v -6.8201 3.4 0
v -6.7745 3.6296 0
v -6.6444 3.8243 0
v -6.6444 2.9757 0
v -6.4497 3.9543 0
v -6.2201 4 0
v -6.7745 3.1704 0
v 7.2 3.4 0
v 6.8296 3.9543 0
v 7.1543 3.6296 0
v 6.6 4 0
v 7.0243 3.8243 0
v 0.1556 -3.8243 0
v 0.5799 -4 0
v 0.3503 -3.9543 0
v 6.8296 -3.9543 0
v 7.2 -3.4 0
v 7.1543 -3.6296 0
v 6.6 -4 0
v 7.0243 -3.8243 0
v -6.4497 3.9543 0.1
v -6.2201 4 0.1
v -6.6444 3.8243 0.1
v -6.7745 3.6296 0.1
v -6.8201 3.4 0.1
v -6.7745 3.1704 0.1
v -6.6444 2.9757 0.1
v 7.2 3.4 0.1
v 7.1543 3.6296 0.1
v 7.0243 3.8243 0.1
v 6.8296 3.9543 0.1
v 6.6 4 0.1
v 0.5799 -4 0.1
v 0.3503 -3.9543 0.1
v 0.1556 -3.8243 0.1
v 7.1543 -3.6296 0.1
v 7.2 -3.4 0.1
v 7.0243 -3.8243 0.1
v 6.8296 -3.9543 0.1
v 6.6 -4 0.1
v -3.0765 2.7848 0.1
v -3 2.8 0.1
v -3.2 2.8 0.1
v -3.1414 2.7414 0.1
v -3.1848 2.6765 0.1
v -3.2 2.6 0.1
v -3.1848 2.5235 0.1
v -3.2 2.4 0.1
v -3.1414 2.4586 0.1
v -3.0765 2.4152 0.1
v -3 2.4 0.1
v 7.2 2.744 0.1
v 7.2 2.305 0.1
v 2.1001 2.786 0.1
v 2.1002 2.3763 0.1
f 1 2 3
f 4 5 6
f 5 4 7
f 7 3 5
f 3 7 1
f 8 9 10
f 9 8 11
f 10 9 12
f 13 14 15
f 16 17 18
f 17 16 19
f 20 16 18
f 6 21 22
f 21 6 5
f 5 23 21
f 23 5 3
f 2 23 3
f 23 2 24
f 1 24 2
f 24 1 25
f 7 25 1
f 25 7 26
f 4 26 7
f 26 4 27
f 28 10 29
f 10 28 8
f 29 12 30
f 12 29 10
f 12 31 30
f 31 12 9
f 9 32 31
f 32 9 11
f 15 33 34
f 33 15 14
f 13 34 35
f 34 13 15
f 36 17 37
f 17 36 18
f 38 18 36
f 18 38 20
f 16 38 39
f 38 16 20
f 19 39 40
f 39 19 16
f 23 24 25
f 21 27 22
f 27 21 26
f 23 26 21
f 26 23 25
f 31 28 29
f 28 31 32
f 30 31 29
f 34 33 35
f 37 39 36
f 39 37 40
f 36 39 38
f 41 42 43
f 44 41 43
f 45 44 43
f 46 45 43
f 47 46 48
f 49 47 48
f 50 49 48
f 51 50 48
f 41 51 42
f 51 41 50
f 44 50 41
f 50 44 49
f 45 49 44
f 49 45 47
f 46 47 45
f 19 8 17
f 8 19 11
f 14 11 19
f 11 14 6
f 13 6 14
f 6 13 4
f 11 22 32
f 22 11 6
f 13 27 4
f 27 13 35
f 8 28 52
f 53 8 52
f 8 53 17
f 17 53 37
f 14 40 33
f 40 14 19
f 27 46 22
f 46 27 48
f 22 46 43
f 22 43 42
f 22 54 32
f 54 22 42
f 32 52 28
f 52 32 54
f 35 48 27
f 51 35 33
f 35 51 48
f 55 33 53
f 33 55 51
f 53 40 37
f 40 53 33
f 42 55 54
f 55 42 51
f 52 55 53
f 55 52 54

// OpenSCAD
// file: ../p/3-8cyli.scad
use <../lib.scad>
function ldraw_lib__3_8cyli() = [
// 0 Cylinder 0.375
// 0 Name: 3-8cyli.dat
// 0 Author: James Jessiman
// 0 !LDRAW_ORG Primitive UPDATE 2005-01
// 0 !LICENSE Licensed under CC BY 4.0 : see CAreadme.txt
// 
// 0 BFC CERTIFY CCW
  [0,"BFC","CERTIFY"],
  [0,"BFC","CCW"],
// 
// 0 !HISTORY 2002-05-08 [OrionP] Made BFC compliant
// 0 !HISTORY 2002-08-18 [PTadmin] Official Update 2002-04
// 0 !HISTORY 2004-12-11 [nielsk] Recreated using Primitive Generator, Edge lines fixed, BFC changed to CCW
// 0 !HISTORY 2005-12-28 [PTadmin] Official Update 2005-01
// 0 !HISTORY 2007-06-24 [PTadmin] Header formatted for Contributor Agreement
// 0 !HISTORY 2008-07-01 [PTadmin] Official Update 2008-01
// 
// 
// 4 16 .9239 1 .3827 .9239 0 .3827 1 0 0 1 1 0
  [4,16,.9239,1,.3827,.9239,0,.3827,1,0,0,1,1,0],
// 4 16 .7071 1 .7071 .7071 0 .7071 .9239 0 .3827 .9239 1 .3827
  [4,16,.7071,1,.7071,.7071,0,.7071,.9239,0,.3827,.9239,1,.3827],
// 4 16 .3827 1 .9239 .3827 0 .9239 .7071 0 .7071 .7071 1 .7071
  [4,16,.3827,1,.9239,.3827,0,.9239,.7071,0,.7071,.7071,1,.7071],
// 4 16 0 1 1 0 0 1 .3827 0 .9239 .3827 1 .9239
  [4,16,0,1,1,0,0,1,.3827,0,.9239,.3827,1,.9239],
// 4 16 -.3827 1 .9239 -.3827 0 .9239 0 0 1 0 1 1
  [4,16,-.3827,1,.9239,-.3827,0,.9239,0,0,1,0,1,1],
// 4 16 -.7071 1 .7071 -.7071 0 .7071 -.3827 0 .9239 -.3827 1 .9239
  [4,16,-.7071,1,.7071,-.7071,0,.7071,-.3827,0,.9239,-.3827,1,.9239],
// 5 24 1 1 0 1 0 0 1 1 -.4142 .9239 1 .3827
  [5,24,1,1,0,1,0,0,1,1,-.4142,.9239,1,.3827],
// 5 24 .9239 1 .3827 .9239 0 .3827 1 1 0 .7071 1 .7071
  [5,24,.9239,1,.3827,.9239,0,.3827,1,1,0,.7071,1,.7071],
// 5 24 .7071 1 .7071 .7071 0 .7071 .9239 1 .3827 .3827 1 .9239
  [5,24,.7071,1,.7071,.7071,0,.7071,.9239,1,.3827,.3827,1,.9239],
// 5 24 .3827 1 .9239 .3827 0 .9239 .7071 1 .7071 0 1 1
  [5,24,.3827,1,.9239,.3827,0,.9239,.7071,1,.7071,0,1,1],
// 5 24 0 1 1 0 0 1 .3827 1 .9239 -.3827 1 .9239
  [5,24,0,1,1,0,0,1,.3827,1,.9239,-.3827,1,.9239],
// 5 24 -.3827 1 .9239 -.3827 0 .9239 0 1 1 -.7071 1 .7071
  [5,24,-.3827,1,.9239,-.3827,0,.9239,0,1,1,-.7071,1,.7071],
// 5 24 -.7071 1 .7071 -.7071 0 .7071 -.3827 1 .9239 -1 1 .4142
  [5,24,-.7071,1,.7071,-.7071,0,.7071,-.3827,1,.9239,-1,1,.4142],
// 0
];
module ldraw_lib__3_8cyli(step=0, col=false, unit=2/5, alt=false, line=0.2, solid=!$preview)
    makepoly(ldraw_lib__3_8cyli(), step=step, col=col, unit=unit, alt=alt, line=line, solid=solid);
ldraw_lib__3_8cyli(line=0.2);
// file: ../p/3-8chrd.scad
use <../lib.scad>
function ldraw_lib__3_8chrd() = [
// 0 Chord 0.375
// 0 Name: 3-8chrd.dat
// 0 Author: Donald Sutter [technog]
// 0 !LDRAW_ORG Primitive UPDATE 2005-01
// 0 !LICENSE Licensed under CC BY 4.0 : see CAreadme.txt
// 
// 0 BFC CERTIFY CCW
  [0,"BFC","CERTIFY"],
  [0,"BFC","CCW"],
// 
// 0 !HISTORY 2004-01-07 [Steffen] added primitive code for POVray
// 0 !HISTORY 2004-03-18 [mkennedy] removed pov code and rearanged polygons.
// 0 !HISTORY 2004-09-12 [cwdee] reversed winding and standardised precision
// 0 !HISTORY 2005-12-28 [PTadmin] Official Update 2005-01
// 0 !HISTORY 2007-06-24 [PTadmin] Header formatted for Contributor Agreement
// 0 !HISTORY 2008-07-01 [PTadmin] Official Update 2008-01
// 
// 
// 3 16 0.7071 0 0.7071 0.3827 0 0.9239 0 0 1
  [3,16,0.7071,0,0.7071,0.3827,0,0.9239,0,0,1],
// 4 16 0.9239 0 0.3827 -0.3827 0 0.9239 -0.7071 0 0.7071 1 0 0
  [4,16,0.9239,0,0.3827,-0.3827,0,0.9239,-0.7071,0,0.7071,1,0,0],
// 4 16 0.7071 0 0.7071 0 0 1 -0.3827 0 0.9239 0.9239 0 0.3827
  [4,16,0.7071,0,0.7071,0,0,1,-0.3827,0,0.9239,0.9239,0,0.3827],
// 0
];
module ldraw_lib__3_8chrd(step=0, col=false, unit=2/5, alt=false, line=0.2, solid=!$preview)
    makepoly(ldraw_lib__3_8chrd(), step=step, col=col, unit=unit, alt=alt, line=line, solid=solid);
ldraw_lib__3_8chrd(line=0.2);
// file: ../p/2-4ndis.scad
use <../lib.scad>
function ldraw_lib__2_4ndis() = [
// 0 Disc Negative 0.5
// 0 Name: 2-4ndis.dat
// 0 Author: James Jessiman
// 0 !LDRAW_ORG Primitive UPDATE 2012-01
// 0 !LICENSE Licensed under CC BY 4.0 : see CAreadme.txt
// 
// 0 BFC CERTIFY CCW
  [0,"BFC","CERTIFY"],
  [0,"BFC","CCW"],
// 
// 0 !HISTORY 2002-03-23 [sbliss] Added BFC statement; compacted code
// 0 !HISTORY 2002-04-25 [PTadmin] Official Update 2002-02
// 0 !HISTORY 2007-06-24 [PTadmin] Header formatted for Contributor Agreement
// 0 !HISTORY 2008-07-01 [PTadmin] Official Update 2008-01
// 0 !HISTORY 2012-02-16 [Philo] Changed to CCW
// 0 !HISTORY 2012-03-30 [PTadmin] Official Update 2012-01
// 
// 
// 3 16 0.9239 0 0.3827 1 0 0 1 0 1
  [3,16,0.9239,0,0.3827,1,0,0,1,0,1],
// 3 16 0.7071 0 0.7071 0.9239 0 0.3827 1 0 1
  [3,16,0.7071,0,0.7071,0.9239,0,0.3827,1,0,1],
// 3 16 0.3827 0 0.9239 0.7071 0 0.7071 1 0 1
  [3,16,0.3827,0,0.9239,0.7071,0,0.7071,1,0,1],
// 3 16 0 0 1 0.3827 0 0.9239 1 0 1
  [3,16,0,0,1,0.3827,0,0.9239,1,0,1],
// 3 16 -0.3827 0 0.9239 0 0 1 -1 0 1
  [3,16,-0.3827,0,0.9239,0,0,1,-1,0,1],
// 3 16 -0.7071 0 0.7071 -0.3827 0 0.9239 -1 0 1
  [3,16,-0.7071,0,0.7071,-0.3827,0,0.9239,-1,0,1],
// 3 16 -0.9239 0 0.3827 -0.7071 0 0.7071 -1 0 1
  [3,16,-0.9239,0,0.3827,-0.7071,0,0.7071,-1,0,1],
// 3 16 -1 0 0 -0.9239 0 0.3827 -1 0 1
  [3,16,-1,0,0,-0.9239,0,0.3827,-1,0,1],
];
module ldraw_lib__2_4ndis(step=0, col=false, unit=2/5, alt=false, line=0.2, solid=!$preview)
    makepoly(ldraw_lib__2_4ndis(), step=step, col=col, unit=unit, alt=alt, line=line, solid=solid);
ldraw_lib__2_4ndis(line=0.2);
// file: ../p/2-4chrd.scad
use <../lib.scad>
function ldraw_lib__2_4chrd() = [
// 0 Chord 0.5
// 0 Name: 2-4chrd.dat
// 0 Author: Philippe Hurbain [Philo]
// 0 !LDRAW_ORG Primitive UPDATE 2014-01
// 0 !LICENSE Licensed under CC BY 4.0 : see CAreadme.txt
// 
// 0 BFC CERTIFY CCW
  [0,"BFC","CERTIFY"],
  [0,"BFC","CCW"],
// 
// 0 !HISTORY 2014-06-21 [PTadmin] Official Update 2014-01
// 
// 
// 4 16 0.9239 0 0.3827 -0.9239 0 0.3827 -1 0 0 1 0 0
  [4,16,0.9239,0,0.3827,-0.9239,0,0.3827,-1,0,0,1,0,0],
// 4 16 0.7071 0 0.7071 -0.7071 0 0.7071 -0.9239 0 0.3827 0.9239 0 0.3827
  [4,16,0.7071,0,0.7071,-0.7071,0,0.7071,-0.9239,0,0.3827,0.9239,0,0.3827],
// 4 16 0.3827 0 0.9239 -0.3827 0 0.9239 -0.7071 0 0.7071 0.7071 0 0.7071
  [4,16,0.3827,0,0.9239,-0.3827,0,0.9239,-0.7071,0,0.7071,0.7071,0,0.7071],
// 3 16 0 0 1 -0.3827 0 0.9239 0.3827 0 0.9239
  [3,16,0,0,1,-0.3827,0,0.9239,0.3827,0,0.9239],
];
module ldraw_lib__2_4chrd(step=0, col=false, unit=2/5, alt=false, line=0.2, solid=!$preview)
    makepoly(ldraw_lib__2_4chrd(), step=step, col=col, unit=unit, alt=alt, line=line, solid=solid);
ldraw_lib__2_4chrd(line=0.2);
// file: ../p/1-8cyli.scad
use <../lib.scad>
function ldraw_lib__1_8cyli() = [
// 0 Cylinder 0.125
// 0 Name: 1-8cyli.dat
// 0 Author: James Jessiman
// 0 !LDRAW_ORG Primitive UPDATE 2005-01
// 0 !LICENSE Licensed under CC BY 4.0 : see CAreadme.txt
// 
// 0 BFC CERTIFY CCW
  [0,"BFC","CERTIFY"],
  [0,"BFC","CCW"],
// 
// 0 !HISTORY 2002-04-25 [PTadmin] Official Update 2002-02
// 0 !HISTORY 2004-12-11 [nielsk] Recreated using Primitive Generator, Edge lines fixed, BFC changed to CCW
// 0 !HISTORY 2005-12-28 [PTadmin] Official Update 2005-01
// 0 !HISTORY 2007-06-22 [PTadmin] Header formatted for Contributor Agreement
// 0 !HISTORY 2008-07-01 [PTadmin] Official Update 2008-01
// 
// 
// 4 16 .9239 1 .3827 .9239 0 .3827 1 0 0 1 1 0
  [4,16,.9239,1,.3827,.9239,0,.3827,1,0,0,1,1,0],
// 4 16 .7071 1 .7071 .7071 0 .7071 .9239 0 .3827 .9239 1 .3827
  [4,16,.7071,1,.7071,.7071,0,.7071,.9239,0,.3827,.9239,1,.3827],
// 5 24 1 1 0 1 0 0 1 1 -.4142 .9239 1 .3827
  [5,24,1,1,0,1,0,0,1,1,-.4142,.9239,1,.3827],
// 5 24 .9239 1 .3827 .9239 0 .3827 1 1 0 .7071 1 .7071
  [5,24,.9239,1,.3827,.9239,0,.3827,1,1,0,.7071,1,.7071],
// 5 24 .7071 1 .7071 .7071 0 .7071 .9239 1 .3827 .4142 1 1
  [5,24,.7071,1,.7071,.7071,0,.7071,.9239,1,.3827,.4142,1,1],
// 0
];
module ldraw_lib__1_8cyli(step=0, col=false, unit=2/5, alt=false, line=0.2, solid=!$preview)
    makepoly(ldraw_lib__1_8cyli(), step=step, col=col, unit=unit, alt=alt, line=line, solid=solid);
ldraw_lib__1_8cyli(line=0.2);
// file: ../p/1-8chrd.scad
use <../lib.scad>
function ldraw_lib__1_8chrd() = [
// 0 Chord 0.125
// 0 Name: 1-8chrd.dat
// 0 Author: Orion Pobursky [OrionP]
// 0 !LDRAW_ORG Primitive UPDATE 2023-05
// 0 !LICENSE Licensed under CC BY 4.0 : see CAreadme.txt
// 
// 0 BFC CERTIFY CCW
  [0,"BFC","CERTIFY"],
  [0,"BFC","CCW"],
// 
// 0 !HISTORY 2004-04-22 [PTadmin] Official Update 2004-02
// 0 !HISTORY 2007-06-22 [PTadmin] Header formatted for Contributor Agreement
// 0 !HISTORY 2008-07-01 [PTadmin] Official Update 2008-01
// 0 !HISTORY 2023-10-27 [OrionP] Rebuilt with PrimGen2, original author westrate
// 0 !HISTORY 2023-10-31 [OrionP] Official Update 2023-05
// 
// 3 16 1 0 0 0.9239 0 0.3827 0.7071 0 0.7071
  [3,16,1,0,0,0.9239,0,0.3827,0.7071,0,0.7071],
];
module ldraw_lib__1_8chrd(step=0, col=false, unit=2/5, alt=false, line=0.2, solid=!$preview)
    makepoly(ldraw_lib__1_8chrd(), step=step, col=col, unit=unit, alt=alt, line=line, solid=solid);
ldraw_lib__1_8chrd(line=0.2);
// file: ../p/1-4cyli.scad
use <../lib.scad>
function ldraw_lib__1_4cyli() = [
// 0 Cylinder 0.25
// 0 Name: 1-4cyli.dat
// 0 Author: James Jessiman
// 0 !LDRAW_ORG Primitive UPDATE 2012-01
// 0 !LICENSE Licensed under CC BY 4.0 : see CAreadme.txt
// 
// 0 BFC CERTIFY CCW
  [0,"BFC","CERTIFY"],
  [0,"BFC","CCW"],
// 
// 0 !HISTORY 2002-03-23 [sbliss] Added BFC statement.
// 0 !HISTORY 2002-04-25 [PTadmin] Official Update 2002-02
// 0 !HISTORY 2007-06-22 [PTadmin] Header formatted for Contributor Agreement
// 0 !HISTORY 2008-07-01 [PTadmin] Official Update 2008-01
// 0 !HISTORY 2012-02-16 [Philo] Changed to CCW
// 0 !HISTORY 2012-03-30 [PTadmin] Official Update 2012-01
// 
// 
// 4 16 1 1 0 0.9239 1 0.3827 0.9239 0 0.3827 1 0 0
  [4,16,1,1,0,0.9239,1,0.3827,0.9239,0,0.3827,1,0,0],
// 5 24 1 0 0 1 1 0 0.9239 0 0.3827 1 0 -1
  [5,24,1,0,0,1,1,0,0.9239,0,0.3827,1,0,-1],
// 4 16 0.9239 1 0.3827 0.7071 1 0.7071 0.7071 0 0.7071 0.9239 0 0.3827
  [4,16,0.9239,1,0.3827,0.7071,1,0.7071,0.7071,0,0.7071,0.9239,0,0.3827],
// 5 24 0.9239 0 0.3827 0.9239 1 0.3827 0.7071 0 0.7071 1 0 0
  [5,24,0.9239,0,0.3827,0.9239,1,0.3827,0.7071,0,0.7071,1,0,0],
// 4 16 0.7071 1 0.7071 0.3827 1 0.9239 0.3827 0 0.9239 0.7071 0 0.7071
  [4,16,0.7071,1,0.7071,0.3827,1,0.9239,0.3827,0,0.9239,0.7071,0,0.7071],
// 5 24 0.7071 0 0.7071 0.7071 1 0.7071 0.3827 0 0.9239 0.9239 0 0.3827
  [5,24,0.7071,0,0.7071,0.7071,1,0.7071,0.3827,0,0.9239,0.9239,0,0.3827],
// 4 16 0.3827 1 0.9239 0 1 1 0 0 1 0.3827 0 0.9239
  [4,16,0.3827,1,0.9239,0,1,1,0,0,1,0.3827,0,0.9239],
// 5 24 0.3827 0 0.9239 0.3827 1 0.9239 0 0 1 0.7071 0 0.7071
  [5,24,0.3827,0,0.9239,0.3827,1,0.9239,0,0,1,0.7071,0,0.7071],
// 5 24 0 0 1 0 1 1 0.3827 0 0.9239 -1 0 1
  [5,24,0,0,1,0,1,1,0.3827,0,0.9239,-1,0,1],
];
module ldraw_lib__1_4cyli(step=0, col=false, unit=2/5, alt=false, line=0.2, solid=!$preview)
    makepoly(ldraw_lib__1_4cyli(), step=step, col=col, unit=unit, alt=alt, line=line, solid=solid);
ldraw_lib__1_4cyli(line=0.2);
// file: ../p/1-4chrd.scad
use <../lib.scad>
function ldraw_lib__1_4chrd() = [
// 0 Chord 0.25
// 0 Name: 1-4chrd.dat
// 0 Author: Max Martin Richter [MMR1988]
// 0 !LDRAW_ORG Primitive UPDATE 2023-05
// 0 !LICENSE Licensed under CC BY 4.0 : see CAreadme.txt
// 
// 0 BFC CERTIFY CCW
  [0,"BFC","CERTIFY"],
  [0,"BFC","CCW"],
// 
// 0 !HISTORY 2004-04-22 [PTadmin] Official Update 2004-02
// 0 !HISTORY 2007-10-09 [PTadmin] Header formatted for Contributor Agreement
// 0 !HISTORY 2008-07-01 [PTadmin] Official Update 2008-01
// 0 !HISTORY 2012-08-02 [MMR1988] Re-creation with PrimGen2 and Rectifier
// 0 !HISTORY 2012-08-09 [PTadmin] Official Update 2012-02
// 0 !HISTORY 2023-10-27 [OrionP] Change author to MMR1988 from hafhead
// 0 !HISTORY 2023-10-31 [OrionP] Official Update 2023-05
// 
// 4 16 0.9239 0 0.3827 0.3827 0 0.9239 0 0 1 1 0 0
  [4,16,0.9239,0,0.3827,0.3827,0,0.9239,0,0,1,1,0,0],
// 3 16 0.7071 0 0.7071 0.3827 0 0.9239 0.9239 0 0.3827
  [3,16,0.7071,0,0.7071,0.3827,0,0.9239,0.9239,0,0.3827],
];
module ldraw_lib__1_4chrd(step=0, col=false, unit=2/5, alt=false, line=0.2, solid=!$preview)
    makepoly(ldraw_lib__1_4chrd(), step=step, col=col, unit=unit, alt=alt, line=line, solid=solid);
ldraw_lib__1_4chrd(line=0.2);
// main file
use <../lib.scad>
use <../p/1-4chrd.scad>
use <../p/1-4cyli.scad>
use <../p/1-8chrd.scad>
use <../p/1-8cyli.scad>
use <../p/2-4chrd.scad>
use <../p/2-4ndis.scad>
use <../p/3-8chrd.scad>
use <../p/3-8cyli.scad>
function ldraw_lib__6148328aj() = [
// 0 Sticker  1.0 x  1.8 with White Stripe on Red Background Right
// 0 Name: 6148328aj.dat
// 0 Author: Massimo Maso [Sirio]
// 0 !LDRAW_ORG Part UPDATE 2024-08
// 0 !LICENSE Licensed under CC BY 4.0 : see CAreadme.txt
// 
// 0 BFC CERTIFY CCW
  [0,"BFC","CERTIFY"],
  [0,"BFC","CCW"],
// 
// 0 !KEYWORDS 917K, Bricklink 75876stk01, Brickowl 852010, Pit Lane, Porsche
// 0 !KEYWORDS Rebrickable 26357, set 75876, Speed Champions
// 
// 0 !HISTORY 2024-09-30 [OrionP] Official Update 2024-08
// 
// 
// 0 // Primitives
// 
// 1 16 -15.5503 0 8.5 0 0 -1.5 0 -1 0 1.5 0 0 3-8chrd.dat
  [1,16,-15.5503,0,8.5,0,0,-1.5,0,-1,0,1.5,0,0, ldraw_lib__3_8chrd()],
// 1 16 16.5 0 8.5 1.5 0 0 0 -1 0 0 0 1.5 1-4chrd.dat
  [1,16,16.5,0,8.5,1.5,0,0,0,-1,0,0,0,1.5, ldraw_lib__1_4chrd()],
// 1 16 1.4497 0 -8.5 0 0 -1.5 0 -1 0 -1.5 0 0 1-8chrd.dat
  [1,16,1.4497,0,-8.5,0,0,-1.5,0,-1,0,-1.5,0,0, ldraw_lib__1_8chrd()],
// 1 16 16.5 0 -8.5 1.5 0 0 0 -1 0 0 0 -1.5 1-4chrd.dat
  [1,16,16.5,0,-8.5,1.5,0,0,0,-1,0,0,0,-1.5, ldraw_lib__1_4chrd()],
// 1 16 -15.5503 0 8.5 0 0 -1.5 0 -.25 0 1.5 0 0 3-8cyli.dat
  [1,16,-15.5503,0,8.5,0,0,-1.5,0,-.25,0,1.5,0,0, ldraw_lib__3_8cyli()],
// 1 16 16.5 0 8.5 1.5 0 0 0 -.25 0 0 0 1.5 1-4cyli.dat
  [1,16,16.5,0,8.5,1.5,0,0,0,-.25,0,0,0,1.5, ldraw_lib__1_4cyli()],
// 1 16 1.4497 0 -8.5 0 0 -1.5 0 -.25 0 -1.5 0 0 1-8cyli.dat
  [1,16,1.4497,0,-8.5,0,0,-1.5,0,-.25,0,-1.5,0,0, ldraw_lib__1_8cyli()],
// 1 16 16.5 0 -8.5 1.5 0 0 0 -.25 0 0 0 -1.5 1-4cyli.dat
  [1,16,16.5,0,-8.5,1.5,0,0,0,-.25,0,0,0,-1.5, ldraw_lib__1_4cyli()],
// 1 4 -15.5503 -.25 8.5 0 0 -1.5 0 1 0 1.5 0 0 3-8chrd.dat
  [1,4,-15.5503,-.25,8.5,0,0,-1.5,0,1,0,1.5,0,0, ldraw_lib__3_8chrd()],
// 1 4 16.5 -.25 8.5 1.5 0 0 0 1 0 0 0 1.5 1-4chrd.dat
  [1,4,16.5,-.25,8.5,1.5,0,0,0,1,0,0,0,1.5, ldraw_lib__1_4chrd()],
// 1 4 1.4497 -.25 -8.5 0 0 -1.5 0 1 0 -1.5 0 0 1-8chrd.dat
  [1,4,1.4497,-.25,-8.5,0,0,-1.5,0,1,0,-1.5,0,0, ldraw_lib__1_8chrd()],
// 1 4 16.5 -.25 -8.5 1.5 0 0 0 1 0 0 0 -1.5 1-4chrd.dat
  [1,4,16.5,-.25,-8.5,1.5,0,0,0,1,0,0,0,-1.5, ldraw_lib__1_4chrd()],
// 1 4 -7.5 -.25 6.5 0 0 -.5 0 1 0 .5 0 0 2-4ndis.dat
  [1,4,-7.5,-.25,6.5,0,0,-.5,0,1,0,.5,0,0, ldraw_lib__2_4ndis()],
// 1 15 -7.5 -.25 6.5 0 0 -.5 0 1 0 .5 0 0 2-4chrd.dat
  [1,15,-7.5,-.25,6.5,0,0,-.5,0,1,0,.5,0,0, ldraw_lib__2_4chrd()],
// 0 // Bottom faces
// 4 16 16.5 0 10 18 0 8.5 18 0 -8.5 16.5 0 -10
  [4,16,16.5,0,10,18,0,8.5,18,0,-8.5,16.5,0,-10],
// 4 16 16.5 0 10 16.5 0 -10 1.4497 0 -10 -15.5503 0 10
  [4,16,16.5,0,10,16.5,0,-10,1.4497,0,-10,-15.5503,0,10],
// 4 16 -15.5503 0 10 1.4497 0 -10 .38905 0 -9.56065 -16.61095 0 7.43935
  [4,16,-15.5503,0,10,1.4497,0,-10,.38905,0,-9.56065,-16.61095,0,7.43935],
// 0 // Lateral faces
// 4 16 16.5 0 10 -15.5503 0 10 -15.5503 -.25 10 16.5 -.25 10
  [4,16,16.5,0,10,-15.5503,0,10,-15.5503,-.25,10,16.5,-.25,10],
// 4 16 .38905 0 -9.56065 .38905 -.25 -9.56065 -16.61095 -.25 7.43935 -16.61095 0 7.43935
  [4,16,.38905,0,-9.56065,.38905,-.25,-9.56065,-16.61095,-.25,7.43935,-16.61095,0,7.43935],
// 3 16 18 0 8.5 18 -.25 8.5 18 -.25 6.86
  [3,16,18,0,8.5,18,-.25,8.5,18,-.25,6.86],
// 4 16 18 0 8.5 18 -.25 6.86 18 -.25 5.7626 18 0 -8.5
  [4,16,18,0,8.5,18,-.25,6.86,18,-.25,5.7626,18,0,-8.5],
// 3 16 18 0 -8.5 18 -.25 5.7626 18 -.25 -8.5
  [3,16,18,0,-8.5,18,-.25,5.7626,18,-.25,-8.5],
// 4 16 1.4497 0 -10 16.5 0 -10 16.5 -.25 -10 1.4497 -.25 -10
  [4,16,1.4497,0,-10,16.5,0,-10,16.5,-.25,-10,1.4497,-.25,-10],
// 0 // Top faces
// 0 // Red faces
// 4 4 -15.5503 -.25 10 -16.61095 -.25 7.43935 -8 -.25 6 -8 -.25 6.5
  [4,4,-15.5503,-.25,10,-16.61095,-.25,7.43935,-8,-.25,6,-8,-.25,6.5],
// 3 4 -15.5503 -.25 10 -8 -.25 6.5 -8 -.25 7
  [3,4,-15.5503,-.25,10,-8,-.25,6.5,-8,-.25,7],
// 3 4 -15.5503 -.25 10 -8 -.25 7 -7.5 -.25 7
  [3,4,-15.5503,-.25,10,-8,-.25,7,-7.5,-.25,7],
// 4 4 -15.5503 -.25 10 -7.5 -.25 7 5.2502 -.25 6.965 16.5 -.25 10
  [4,4,-15.5503,-.25,10,-7.5,-.25,7,5.2502,-.25,6.965,16.5,-.25,10],
// 4 4 16.5 -.25 10 5.2502 -.25 6.965 18 -.25 6.86 18 -.25 8.5
  [4,4,16.5,-.25,10,5.2502,-.25,6.965,18,-.25,6.86,18,-.25,8.5],
// 3 4 .38905 -.25 -9.56065 -8 -.25 6 -16.61095 -.25 7.43935
  [3,4,.38905,-.25,-9.56065,-8,-.25,6,-16.61095,-.25,7.43935],
// 4 4 .38905 -.25 -9.56065 1.4497 -.25 -10 -7.5 -.25 6 -8 -.25 6
  [4,4,.38905,-.25,-9.56065,1.4497,-.25,-10,-7.5,-.25,6,-8,-.25,6],
// 4 4 1.4497 -.25 -10 18 -.25 5.7626 5.2506 -.25 5.9407 -7.5 -.25 6
  [4,4,1.4497,-.25,-10,18,-.25,5.7626,5.2506,-.25,5.9407,-7.5,-.25,6],
// 4 4 1.4497 -.25 -10 16.5 -.25 -10 18 -.25 -8.5 18 -.25 5.7626
  [4,4,1.4497,-.25,-10,16.5,-.25,-10,18,-.25,-8.5,18,-.25,5.7626],
// 0 // White faces
// 4 15 5.2502 -.25 6.965 -7.5 -.25 7 -7.5 -.25 6 5.2506 -.25 5.9407
  [4,15,5.2502,-.25,6.965,-7.5,-.25,7,-7.5,-.25,6,5.2506,-.25,5.9407],
// 4 15 5.2502 -.25 6.965 5.2506 -.25 5.9407 18 -.25 5.7626 18 -.25 6.86
  [4,15,5.2502,-.25,6.965,5.2506,-.25,5.9407,18,-.25,5.7626,18,-.25,6.86],
];
module ldraw_lib__6148328aj(step=0, col=false, unit=2/5, alt=false, line=0.2, solid=!$preview)
    makepoly(ldraw_lib__6148328aj(), step=step, col=col, unit=unit, alt=alt, line=line, solid=solid);
ldraw_lib__6148328aj(line=0.2);
